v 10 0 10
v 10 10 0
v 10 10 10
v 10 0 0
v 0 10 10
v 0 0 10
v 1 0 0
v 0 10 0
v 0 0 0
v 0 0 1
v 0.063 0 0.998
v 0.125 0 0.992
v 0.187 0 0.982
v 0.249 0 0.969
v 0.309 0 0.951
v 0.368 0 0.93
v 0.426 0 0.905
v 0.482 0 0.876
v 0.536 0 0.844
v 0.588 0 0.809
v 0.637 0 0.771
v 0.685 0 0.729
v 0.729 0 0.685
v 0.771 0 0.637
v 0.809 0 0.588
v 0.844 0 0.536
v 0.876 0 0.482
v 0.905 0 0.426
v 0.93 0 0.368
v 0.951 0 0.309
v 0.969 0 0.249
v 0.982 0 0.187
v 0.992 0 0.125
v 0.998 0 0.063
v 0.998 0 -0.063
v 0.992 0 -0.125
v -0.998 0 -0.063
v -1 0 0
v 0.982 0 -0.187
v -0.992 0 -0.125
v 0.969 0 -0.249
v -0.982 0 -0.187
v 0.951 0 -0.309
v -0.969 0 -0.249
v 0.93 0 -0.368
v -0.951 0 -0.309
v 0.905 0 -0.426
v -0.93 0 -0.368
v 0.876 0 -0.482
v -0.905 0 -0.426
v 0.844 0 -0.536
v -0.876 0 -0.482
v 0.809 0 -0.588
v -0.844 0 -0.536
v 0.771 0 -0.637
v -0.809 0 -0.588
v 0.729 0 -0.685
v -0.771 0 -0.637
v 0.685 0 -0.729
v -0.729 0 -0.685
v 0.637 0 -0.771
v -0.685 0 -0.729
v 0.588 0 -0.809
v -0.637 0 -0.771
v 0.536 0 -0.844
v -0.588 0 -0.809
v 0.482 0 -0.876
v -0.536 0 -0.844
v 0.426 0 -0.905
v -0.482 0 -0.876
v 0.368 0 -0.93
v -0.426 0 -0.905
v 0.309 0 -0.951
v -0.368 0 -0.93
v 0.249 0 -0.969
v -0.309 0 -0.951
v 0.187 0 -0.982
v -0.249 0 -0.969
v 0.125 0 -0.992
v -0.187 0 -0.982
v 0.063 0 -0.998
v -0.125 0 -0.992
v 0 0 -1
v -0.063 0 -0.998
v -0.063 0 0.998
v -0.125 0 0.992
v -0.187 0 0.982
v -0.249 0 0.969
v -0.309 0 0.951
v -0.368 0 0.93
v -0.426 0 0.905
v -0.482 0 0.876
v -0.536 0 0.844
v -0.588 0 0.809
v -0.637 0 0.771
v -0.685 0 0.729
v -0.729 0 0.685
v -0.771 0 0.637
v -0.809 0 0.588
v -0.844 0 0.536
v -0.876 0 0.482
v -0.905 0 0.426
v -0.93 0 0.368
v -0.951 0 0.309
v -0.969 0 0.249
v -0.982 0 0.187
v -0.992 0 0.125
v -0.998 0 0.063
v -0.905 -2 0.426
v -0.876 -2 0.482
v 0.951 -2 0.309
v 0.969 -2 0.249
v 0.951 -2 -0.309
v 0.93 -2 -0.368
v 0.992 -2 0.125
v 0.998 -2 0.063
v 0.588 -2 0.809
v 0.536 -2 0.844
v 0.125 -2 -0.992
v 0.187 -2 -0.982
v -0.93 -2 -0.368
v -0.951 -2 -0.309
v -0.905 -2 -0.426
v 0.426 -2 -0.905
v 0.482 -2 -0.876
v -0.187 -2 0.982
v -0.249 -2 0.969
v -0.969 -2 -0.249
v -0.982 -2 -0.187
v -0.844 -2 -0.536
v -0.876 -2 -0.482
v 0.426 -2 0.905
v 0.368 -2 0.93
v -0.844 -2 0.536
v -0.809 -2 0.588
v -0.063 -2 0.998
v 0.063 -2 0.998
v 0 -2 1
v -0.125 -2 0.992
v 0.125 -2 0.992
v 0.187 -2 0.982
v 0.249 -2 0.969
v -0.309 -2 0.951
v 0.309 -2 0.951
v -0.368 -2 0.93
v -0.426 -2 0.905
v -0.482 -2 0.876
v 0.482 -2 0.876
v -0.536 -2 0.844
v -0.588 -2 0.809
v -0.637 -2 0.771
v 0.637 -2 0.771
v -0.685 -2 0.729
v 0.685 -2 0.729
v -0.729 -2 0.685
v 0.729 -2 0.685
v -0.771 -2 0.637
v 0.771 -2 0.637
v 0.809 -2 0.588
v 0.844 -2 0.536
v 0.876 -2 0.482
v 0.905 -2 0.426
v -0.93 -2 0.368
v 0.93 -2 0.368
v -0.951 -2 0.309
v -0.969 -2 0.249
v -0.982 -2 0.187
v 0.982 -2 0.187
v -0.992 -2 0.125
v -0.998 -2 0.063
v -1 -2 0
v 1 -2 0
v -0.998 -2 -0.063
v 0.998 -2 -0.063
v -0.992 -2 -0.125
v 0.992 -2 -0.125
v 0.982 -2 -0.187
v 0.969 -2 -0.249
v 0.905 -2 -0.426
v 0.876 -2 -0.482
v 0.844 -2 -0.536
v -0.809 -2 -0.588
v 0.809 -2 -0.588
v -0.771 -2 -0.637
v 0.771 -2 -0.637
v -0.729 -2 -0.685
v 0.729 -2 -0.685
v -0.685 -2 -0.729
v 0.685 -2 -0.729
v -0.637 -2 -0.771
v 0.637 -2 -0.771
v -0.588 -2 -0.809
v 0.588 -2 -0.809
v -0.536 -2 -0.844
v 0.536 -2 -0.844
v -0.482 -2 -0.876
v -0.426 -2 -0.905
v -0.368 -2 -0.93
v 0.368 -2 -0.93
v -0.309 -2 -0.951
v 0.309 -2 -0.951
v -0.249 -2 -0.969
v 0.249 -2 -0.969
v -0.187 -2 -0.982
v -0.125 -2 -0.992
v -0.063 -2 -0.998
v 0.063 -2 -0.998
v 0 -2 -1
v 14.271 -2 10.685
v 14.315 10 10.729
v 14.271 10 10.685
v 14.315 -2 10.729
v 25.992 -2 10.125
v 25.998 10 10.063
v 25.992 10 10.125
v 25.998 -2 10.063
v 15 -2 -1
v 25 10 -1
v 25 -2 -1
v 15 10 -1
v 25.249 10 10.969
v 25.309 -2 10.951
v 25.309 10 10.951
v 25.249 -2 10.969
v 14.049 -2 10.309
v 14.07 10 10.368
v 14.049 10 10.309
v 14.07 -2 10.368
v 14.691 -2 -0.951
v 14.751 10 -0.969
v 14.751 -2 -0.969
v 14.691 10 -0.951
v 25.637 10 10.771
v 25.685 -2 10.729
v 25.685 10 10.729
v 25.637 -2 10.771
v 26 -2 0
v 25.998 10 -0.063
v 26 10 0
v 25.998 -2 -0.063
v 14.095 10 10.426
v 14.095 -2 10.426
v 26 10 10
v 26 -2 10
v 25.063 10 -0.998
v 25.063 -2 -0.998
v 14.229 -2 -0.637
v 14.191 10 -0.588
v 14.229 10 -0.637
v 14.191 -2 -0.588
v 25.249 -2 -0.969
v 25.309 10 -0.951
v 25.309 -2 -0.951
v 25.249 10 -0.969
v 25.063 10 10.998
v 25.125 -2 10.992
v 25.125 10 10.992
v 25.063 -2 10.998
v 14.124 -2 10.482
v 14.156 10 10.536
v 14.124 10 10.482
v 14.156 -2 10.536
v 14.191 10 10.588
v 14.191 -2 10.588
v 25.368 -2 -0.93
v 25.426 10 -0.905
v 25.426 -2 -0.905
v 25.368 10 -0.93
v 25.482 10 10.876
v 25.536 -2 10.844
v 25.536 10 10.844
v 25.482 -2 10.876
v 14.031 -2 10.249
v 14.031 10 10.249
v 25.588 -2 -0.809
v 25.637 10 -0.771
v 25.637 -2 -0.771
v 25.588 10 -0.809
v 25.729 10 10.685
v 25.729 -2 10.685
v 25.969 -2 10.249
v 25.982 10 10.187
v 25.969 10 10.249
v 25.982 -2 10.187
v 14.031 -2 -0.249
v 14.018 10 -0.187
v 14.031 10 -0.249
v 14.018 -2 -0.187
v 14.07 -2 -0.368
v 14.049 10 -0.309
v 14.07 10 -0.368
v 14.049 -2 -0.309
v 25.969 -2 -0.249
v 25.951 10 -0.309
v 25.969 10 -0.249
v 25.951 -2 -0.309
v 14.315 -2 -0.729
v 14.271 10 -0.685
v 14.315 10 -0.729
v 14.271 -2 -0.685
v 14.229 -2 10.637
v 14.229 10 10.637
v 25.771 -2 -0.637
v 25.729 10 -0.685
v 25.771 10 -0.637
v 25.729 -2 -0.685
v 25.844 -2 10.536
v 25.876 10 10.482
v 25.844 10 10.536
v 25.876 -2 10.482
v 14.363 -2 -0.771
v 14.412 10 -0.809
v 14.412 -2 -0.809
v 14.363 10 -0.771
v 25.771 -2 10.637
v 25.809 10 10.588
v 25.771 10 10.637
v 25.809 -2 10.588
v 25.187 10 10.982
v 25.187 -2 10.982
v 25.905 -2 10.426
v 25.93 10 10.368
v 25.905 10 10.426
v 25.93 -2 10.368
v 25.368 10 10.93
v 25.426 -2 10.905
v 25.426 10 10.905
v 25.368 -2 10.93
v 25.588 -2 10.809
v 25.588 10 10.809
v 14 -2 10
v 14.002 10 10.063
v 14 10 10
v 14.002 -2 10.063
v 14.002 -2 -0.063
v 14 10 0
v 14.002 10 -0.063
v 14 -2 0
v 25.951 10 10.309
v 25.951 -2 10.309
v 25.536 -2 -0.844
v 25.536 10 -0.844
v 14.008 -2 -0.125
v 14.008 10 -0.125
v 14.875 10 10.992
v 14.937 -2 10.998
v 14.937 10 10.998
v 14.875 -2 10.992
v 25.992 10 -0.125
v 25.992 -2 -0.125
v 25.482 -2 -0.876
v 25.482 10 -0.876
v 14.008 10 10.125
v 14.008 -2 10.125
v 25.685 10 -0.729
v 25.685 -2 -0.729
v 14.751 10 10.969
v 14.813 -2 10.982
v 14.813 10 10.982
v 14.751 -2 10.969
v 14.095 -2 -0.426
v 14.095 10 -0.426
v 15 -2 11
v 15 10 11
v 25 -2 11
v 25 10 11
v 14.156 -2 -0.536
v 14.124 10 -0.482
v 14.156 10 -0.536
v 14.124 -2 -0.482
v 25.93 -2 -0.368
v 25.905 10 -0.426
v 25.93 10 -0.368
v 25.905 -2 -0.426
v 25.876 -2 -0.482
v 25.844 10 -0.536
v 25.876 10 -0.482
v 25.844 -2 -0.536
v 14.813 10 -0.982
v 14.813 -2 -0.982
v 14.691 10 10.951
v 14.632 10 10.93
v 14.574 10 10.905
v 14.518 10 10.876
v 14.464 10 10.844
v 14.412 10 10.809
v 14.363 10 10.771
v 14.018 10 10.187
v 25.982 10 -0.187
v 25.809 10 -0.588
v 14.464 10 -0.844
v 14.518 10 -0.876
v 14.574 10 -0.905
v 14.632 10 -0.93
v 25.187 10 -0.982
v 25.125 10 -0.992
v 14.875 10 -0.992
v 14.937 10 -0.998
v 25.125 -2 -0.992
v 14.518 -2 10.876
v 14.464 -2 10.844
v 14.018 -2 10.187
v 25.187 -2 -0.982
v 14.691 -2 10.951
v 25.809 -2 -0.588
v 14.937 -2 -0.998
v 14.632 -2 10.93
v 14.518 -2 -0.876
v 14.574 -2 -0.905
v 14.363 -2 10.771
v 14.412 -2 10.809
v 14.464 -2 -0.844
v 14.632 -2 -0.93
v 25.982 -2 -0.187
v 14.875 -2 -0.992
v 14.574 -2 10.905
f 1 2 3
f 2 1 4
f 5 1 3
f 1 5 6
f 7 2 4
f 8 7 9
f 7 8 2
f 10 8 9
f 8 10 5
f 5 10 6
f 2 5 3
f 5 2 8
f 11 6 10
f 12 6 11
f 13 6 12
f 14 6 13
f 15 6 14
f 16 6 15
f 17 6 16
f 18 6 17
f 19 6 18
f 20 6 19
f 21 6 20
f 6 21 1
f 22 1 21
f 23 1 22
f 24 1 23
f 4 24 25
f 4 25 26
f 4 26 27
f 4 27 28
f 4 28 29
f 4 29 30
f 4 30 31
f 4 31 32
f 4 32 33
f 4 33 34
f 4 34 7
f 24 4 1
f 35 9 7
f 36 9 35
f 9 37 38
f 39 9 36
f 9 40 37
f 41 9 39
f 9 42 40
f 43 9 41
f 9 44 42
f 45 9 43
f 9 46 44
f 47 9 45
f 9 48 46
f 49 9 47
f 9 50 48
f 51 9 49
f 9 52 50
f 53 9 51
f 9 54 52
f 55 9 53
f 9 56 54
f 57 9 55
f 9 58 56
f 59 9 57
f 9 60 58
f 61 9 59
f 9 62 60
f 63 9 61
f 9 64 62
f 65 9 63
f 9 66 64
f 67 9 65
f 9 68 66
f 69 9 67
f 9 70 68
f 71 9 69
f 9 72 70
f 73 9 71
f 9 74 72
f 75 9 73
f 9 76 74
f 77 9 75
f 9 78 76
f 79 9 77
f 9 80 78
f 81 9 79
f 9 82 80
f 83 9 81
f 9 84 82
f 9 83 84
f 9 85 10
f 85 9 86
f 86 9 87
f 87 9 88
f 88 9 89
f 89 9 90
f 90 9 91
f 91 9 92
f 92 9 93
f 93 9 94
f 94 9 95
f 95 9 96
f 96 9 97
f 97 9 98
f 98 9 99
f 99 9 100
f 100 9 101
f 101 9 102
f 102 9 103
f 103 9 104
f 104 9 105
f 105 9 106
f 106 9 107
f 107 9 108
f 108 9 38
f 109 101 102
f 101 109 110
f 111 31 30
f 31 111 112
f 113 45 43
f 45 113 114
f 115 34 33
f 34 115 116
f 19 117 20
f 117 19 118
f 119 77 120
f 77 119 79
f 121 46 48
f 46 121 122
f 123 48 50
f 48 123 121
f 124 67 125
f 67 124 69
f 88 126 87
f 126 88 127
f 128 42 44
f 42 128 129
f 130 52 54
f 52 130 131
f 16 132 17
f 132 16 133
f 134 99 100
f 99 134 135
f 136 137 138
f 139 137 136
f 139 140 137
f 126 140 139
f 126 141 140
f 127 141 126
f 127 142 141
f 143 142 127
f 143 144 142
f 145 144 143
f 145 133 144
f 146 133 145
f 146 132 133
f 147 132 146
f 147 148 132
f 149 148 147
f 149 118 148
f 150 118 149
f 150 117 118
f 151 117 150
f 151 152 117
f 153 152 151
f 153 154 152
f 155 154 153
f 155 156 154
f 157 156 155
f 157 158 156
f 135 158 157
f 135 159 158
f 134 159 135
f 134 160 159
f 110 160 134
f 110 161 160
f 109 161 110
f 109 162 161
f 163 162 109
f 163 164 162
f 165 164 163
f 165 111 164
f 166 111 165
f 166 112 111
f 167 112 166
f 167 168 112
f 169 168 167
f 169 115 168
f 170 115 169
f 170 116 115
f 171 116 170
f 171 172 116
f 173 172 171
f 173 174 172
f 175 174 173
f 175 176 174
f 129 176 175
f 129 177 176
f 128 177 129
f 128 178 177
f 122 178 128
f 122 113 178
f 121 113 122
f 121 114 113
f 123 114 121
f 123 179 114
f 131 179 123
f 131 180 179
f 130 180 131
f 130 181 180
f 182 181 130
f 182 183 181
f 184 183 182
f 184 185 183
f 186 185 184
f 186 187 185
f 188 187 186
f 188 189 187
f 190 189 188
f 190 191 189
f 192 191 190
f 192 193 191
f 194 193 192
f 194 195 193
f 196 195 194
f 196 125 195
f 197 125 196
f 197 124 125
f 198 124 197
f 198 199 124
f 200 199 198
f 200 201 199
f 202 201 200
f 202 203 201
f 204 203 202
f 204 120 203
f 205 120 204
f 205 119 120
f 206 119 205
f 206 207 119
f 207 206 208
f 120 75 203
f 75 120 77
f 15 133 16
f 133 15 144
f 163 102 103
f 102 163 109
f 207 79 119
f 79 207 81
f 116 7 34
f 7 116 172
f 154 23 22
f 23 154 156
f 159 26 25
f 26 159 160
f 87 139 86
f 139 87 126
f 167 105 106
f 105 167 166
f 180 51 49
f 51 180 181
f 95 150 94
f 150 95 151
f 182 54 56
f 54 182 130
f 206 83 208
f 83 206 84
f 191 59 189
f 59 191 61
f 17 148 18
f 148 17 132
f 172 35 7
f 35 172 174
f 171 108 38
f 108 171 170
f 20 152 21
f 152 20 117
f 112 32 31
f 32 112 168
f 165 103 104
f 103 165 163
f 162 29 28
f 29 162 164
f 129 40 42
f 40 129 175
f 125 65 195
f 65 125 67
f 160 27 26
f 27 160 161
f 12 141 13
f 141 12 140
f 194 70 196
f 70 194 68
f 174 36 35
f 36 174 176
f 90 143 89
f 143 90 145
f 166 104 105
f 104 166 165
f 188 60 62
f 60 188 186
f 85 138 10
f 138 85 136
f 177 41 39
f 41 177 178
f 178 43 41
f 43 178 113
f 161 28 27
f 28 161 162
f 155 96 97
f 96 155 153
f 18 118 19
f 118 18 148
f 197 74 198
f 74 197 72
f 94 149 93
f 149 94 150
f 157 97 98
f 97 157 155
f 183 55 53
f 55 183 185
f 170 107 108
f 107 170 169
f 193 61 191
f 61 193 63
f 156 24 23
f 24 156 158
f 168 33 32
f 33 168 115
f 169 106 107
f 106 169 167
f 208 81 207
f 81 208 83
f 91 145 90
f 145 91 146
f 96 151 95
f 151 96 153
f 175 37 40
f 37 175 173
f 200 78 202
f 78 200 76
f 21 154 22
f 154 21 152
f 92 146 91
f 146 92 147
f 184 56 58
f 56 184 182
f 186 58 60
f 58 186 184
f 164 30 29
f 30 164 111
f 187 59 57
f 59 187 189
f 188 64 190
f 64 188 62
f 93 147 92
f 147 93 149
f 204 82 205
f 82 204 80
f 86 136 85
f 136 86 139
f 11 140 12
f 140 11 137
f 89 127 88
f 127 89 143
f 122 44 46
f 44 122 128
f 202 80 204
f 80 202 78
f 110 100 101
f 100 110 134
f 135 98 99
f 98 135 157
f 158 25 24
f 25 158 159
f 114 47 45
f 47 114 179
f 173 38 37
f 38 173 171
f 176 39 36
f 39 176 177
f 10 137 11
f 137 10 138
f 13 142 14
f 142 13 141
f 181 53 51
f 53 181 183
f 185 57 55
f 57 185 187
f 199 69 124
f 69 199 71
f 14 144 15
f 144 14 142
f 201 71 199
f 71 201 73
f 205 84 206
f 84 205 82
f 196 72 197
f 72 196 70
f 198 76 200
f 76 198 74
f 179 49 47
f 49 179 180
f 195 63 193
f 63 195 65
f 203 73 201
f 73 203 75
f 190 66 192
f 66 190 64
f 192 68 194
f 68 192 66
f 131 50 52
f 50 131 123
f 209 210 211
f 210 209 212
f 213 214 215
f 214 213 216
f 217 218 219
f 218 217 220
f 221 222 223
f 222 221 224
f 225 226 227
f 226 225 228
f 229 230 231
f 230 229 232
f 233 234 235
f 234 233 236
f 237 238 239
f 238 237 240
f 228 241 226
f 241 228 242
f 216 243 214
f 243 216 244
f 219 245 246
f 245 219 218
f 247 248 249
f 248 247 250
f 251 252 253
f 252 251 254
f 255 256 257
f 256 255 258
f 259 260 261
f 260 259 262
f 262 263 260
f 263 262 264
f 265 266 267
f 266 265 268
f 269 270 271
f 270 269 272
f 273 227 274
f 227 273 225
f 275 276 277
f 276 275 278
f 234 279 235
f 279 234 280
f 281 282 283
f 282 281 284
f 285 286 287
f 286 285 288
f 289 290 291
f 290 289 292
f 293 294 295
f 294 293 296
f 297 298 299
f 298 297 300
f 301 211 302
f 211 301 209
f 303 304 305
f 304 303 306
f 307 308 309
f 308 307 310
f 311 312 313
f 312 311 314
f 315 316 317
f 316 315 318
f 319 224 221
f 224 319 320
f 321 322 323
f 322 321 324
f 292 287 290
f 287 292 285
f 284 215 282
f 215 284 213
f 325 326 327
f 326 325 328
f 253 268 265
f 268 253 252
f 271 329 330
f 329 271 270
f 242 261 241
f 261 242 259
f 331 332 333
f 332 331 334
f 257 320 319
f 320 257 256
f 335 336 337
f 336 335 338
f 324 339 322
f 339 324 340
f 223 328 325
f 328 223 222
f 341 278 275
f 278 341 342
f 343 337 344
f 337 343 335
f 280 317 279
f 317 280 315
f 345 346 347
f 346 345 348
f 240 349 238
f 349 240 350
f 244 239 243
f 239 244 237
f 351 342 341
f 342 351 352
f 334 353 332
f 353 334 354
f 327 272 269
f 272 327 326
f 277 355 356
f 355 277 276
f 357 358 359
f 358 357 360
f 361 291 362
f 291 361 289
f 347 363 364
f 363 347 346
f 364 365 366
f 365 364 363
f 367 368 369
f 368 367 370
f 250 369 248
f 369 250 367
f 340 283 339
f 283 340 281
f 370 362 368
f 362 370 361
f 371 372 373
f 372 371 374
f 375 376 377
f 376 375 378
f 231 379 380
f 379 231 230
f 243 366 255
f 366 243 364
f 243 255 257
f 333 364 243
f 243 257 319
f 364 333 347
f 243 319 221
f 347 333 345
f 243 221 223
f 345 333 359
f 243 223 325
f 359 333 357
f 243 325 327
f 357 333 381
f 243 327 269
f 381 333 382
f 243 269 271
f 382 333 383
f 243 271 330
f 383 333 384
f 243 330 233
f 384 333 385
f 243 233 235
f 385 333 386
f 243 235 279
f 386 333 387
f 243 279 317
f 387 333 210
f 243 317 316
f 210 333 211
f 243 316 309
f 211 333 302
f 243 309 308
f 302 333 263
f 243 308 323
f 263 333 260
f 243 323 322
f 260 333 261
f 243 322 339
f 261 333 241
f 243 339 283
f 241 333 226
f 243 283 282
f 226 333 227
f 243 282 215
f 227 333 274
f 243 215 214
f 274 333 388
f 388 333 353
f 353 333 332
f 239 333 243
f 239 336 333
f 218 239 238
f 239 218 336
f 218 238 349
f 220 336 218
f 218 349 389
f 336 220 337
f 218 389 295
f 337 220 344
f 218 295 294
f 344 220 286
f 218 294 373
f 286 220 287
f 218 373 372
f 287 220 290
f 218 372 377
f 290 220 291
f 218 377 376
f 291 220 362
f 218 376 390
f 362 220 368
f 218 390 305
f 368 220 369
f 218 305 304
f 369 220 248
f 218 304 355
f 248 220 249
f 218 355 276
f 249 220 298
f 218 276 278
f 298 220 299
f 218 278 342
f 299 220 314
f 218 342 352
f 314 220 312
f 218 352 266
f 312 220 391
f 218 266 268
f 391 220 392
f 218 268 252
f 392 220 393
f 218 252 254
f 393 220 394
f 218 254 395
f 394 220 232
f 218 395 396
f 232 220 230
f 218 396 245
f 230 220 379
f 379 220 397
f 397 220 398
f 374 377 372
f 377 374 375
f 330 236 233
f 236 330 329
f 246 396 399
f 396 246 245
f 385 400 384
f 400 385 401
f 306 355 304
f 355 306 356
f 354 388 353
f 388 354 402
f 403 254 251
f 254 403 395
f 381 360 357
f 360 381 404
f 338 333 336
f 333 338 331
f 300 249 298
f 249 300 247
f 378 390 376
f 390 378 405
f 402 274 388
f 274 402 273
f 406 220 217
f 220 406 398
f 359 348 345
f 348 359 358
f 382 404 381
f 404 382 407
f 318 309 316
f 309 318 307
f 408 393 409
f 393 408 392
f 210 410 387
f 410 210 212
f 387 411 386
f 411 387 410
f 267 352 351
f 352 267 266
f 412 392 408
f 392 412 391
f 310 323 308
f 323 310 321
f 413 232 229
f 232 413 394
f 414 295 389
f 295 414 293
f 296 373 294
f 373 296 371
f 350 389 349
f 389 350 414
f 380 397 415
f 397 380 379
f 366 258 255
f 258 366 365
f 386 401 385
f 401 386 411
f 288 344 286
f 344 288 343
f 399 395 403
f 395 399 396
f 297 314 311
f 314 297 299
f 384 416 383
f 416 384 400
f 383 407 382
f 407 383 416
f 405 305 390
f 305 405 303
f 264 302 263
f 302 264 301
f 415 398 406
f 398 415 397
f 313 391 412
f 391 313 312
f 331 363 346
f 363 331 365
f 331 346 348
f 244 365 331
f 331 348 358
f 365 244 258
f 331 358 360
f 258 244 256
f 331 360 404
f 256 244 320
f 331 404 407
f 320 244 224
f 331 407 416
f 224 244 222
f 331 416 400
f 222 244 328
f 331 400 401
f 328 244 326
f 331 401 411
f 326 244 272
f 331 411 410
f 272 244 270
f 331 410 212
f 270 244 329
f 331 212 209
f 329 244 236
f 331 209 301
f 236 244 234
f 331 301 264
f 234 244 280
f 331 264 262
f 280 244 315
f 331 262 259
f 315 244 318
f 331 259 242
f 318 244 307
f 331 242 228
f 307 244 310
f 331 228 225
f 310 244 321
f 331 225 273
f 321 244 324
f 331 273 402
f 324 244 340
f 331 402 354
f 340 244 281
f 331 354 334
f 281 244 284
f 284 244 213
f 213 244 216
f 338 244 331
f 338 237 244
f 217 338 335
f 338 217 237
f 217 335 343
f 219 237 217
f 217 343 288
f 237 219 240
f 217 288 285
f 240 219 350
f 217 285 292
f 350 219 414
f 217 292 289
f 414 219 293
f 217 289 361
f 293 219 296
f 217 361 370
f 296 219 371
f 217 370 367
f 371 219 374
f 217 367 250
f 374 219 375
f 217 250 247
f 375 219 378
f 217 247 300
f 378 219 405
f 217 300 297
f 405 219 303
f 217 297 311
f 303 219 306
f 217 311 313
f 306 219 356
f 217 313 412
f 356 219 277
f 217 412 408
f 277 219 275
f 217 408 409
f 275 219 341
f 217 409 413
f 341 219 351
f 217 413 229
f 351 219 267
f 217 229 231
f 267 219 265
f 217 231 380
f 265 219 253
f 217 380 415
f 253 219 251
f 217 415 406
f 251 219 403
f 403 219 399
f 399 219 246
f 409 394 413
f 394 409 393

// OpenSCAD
original_cube = [10, 10, 10]; // Cube dimensions.

// Cylinder dimensions.
original_cylinder_radius = 2;
original_cylinder_height = 1;

cube(original_cube);
rotate([90, 0, 0])
    cylinder(original_cylinder_radius, original_cylinder_height, $fn = 100);

/*
 * The Minkowski function merges object together to form a single shape.
 */
translate([15, 0, 0]) {
    minkowski() {
        cube(original_cube);
        rotate([90, 0, 0])
            cylinder(original_cylinder_radius, original_cylinder_height, $fn = 100);
    }
}
